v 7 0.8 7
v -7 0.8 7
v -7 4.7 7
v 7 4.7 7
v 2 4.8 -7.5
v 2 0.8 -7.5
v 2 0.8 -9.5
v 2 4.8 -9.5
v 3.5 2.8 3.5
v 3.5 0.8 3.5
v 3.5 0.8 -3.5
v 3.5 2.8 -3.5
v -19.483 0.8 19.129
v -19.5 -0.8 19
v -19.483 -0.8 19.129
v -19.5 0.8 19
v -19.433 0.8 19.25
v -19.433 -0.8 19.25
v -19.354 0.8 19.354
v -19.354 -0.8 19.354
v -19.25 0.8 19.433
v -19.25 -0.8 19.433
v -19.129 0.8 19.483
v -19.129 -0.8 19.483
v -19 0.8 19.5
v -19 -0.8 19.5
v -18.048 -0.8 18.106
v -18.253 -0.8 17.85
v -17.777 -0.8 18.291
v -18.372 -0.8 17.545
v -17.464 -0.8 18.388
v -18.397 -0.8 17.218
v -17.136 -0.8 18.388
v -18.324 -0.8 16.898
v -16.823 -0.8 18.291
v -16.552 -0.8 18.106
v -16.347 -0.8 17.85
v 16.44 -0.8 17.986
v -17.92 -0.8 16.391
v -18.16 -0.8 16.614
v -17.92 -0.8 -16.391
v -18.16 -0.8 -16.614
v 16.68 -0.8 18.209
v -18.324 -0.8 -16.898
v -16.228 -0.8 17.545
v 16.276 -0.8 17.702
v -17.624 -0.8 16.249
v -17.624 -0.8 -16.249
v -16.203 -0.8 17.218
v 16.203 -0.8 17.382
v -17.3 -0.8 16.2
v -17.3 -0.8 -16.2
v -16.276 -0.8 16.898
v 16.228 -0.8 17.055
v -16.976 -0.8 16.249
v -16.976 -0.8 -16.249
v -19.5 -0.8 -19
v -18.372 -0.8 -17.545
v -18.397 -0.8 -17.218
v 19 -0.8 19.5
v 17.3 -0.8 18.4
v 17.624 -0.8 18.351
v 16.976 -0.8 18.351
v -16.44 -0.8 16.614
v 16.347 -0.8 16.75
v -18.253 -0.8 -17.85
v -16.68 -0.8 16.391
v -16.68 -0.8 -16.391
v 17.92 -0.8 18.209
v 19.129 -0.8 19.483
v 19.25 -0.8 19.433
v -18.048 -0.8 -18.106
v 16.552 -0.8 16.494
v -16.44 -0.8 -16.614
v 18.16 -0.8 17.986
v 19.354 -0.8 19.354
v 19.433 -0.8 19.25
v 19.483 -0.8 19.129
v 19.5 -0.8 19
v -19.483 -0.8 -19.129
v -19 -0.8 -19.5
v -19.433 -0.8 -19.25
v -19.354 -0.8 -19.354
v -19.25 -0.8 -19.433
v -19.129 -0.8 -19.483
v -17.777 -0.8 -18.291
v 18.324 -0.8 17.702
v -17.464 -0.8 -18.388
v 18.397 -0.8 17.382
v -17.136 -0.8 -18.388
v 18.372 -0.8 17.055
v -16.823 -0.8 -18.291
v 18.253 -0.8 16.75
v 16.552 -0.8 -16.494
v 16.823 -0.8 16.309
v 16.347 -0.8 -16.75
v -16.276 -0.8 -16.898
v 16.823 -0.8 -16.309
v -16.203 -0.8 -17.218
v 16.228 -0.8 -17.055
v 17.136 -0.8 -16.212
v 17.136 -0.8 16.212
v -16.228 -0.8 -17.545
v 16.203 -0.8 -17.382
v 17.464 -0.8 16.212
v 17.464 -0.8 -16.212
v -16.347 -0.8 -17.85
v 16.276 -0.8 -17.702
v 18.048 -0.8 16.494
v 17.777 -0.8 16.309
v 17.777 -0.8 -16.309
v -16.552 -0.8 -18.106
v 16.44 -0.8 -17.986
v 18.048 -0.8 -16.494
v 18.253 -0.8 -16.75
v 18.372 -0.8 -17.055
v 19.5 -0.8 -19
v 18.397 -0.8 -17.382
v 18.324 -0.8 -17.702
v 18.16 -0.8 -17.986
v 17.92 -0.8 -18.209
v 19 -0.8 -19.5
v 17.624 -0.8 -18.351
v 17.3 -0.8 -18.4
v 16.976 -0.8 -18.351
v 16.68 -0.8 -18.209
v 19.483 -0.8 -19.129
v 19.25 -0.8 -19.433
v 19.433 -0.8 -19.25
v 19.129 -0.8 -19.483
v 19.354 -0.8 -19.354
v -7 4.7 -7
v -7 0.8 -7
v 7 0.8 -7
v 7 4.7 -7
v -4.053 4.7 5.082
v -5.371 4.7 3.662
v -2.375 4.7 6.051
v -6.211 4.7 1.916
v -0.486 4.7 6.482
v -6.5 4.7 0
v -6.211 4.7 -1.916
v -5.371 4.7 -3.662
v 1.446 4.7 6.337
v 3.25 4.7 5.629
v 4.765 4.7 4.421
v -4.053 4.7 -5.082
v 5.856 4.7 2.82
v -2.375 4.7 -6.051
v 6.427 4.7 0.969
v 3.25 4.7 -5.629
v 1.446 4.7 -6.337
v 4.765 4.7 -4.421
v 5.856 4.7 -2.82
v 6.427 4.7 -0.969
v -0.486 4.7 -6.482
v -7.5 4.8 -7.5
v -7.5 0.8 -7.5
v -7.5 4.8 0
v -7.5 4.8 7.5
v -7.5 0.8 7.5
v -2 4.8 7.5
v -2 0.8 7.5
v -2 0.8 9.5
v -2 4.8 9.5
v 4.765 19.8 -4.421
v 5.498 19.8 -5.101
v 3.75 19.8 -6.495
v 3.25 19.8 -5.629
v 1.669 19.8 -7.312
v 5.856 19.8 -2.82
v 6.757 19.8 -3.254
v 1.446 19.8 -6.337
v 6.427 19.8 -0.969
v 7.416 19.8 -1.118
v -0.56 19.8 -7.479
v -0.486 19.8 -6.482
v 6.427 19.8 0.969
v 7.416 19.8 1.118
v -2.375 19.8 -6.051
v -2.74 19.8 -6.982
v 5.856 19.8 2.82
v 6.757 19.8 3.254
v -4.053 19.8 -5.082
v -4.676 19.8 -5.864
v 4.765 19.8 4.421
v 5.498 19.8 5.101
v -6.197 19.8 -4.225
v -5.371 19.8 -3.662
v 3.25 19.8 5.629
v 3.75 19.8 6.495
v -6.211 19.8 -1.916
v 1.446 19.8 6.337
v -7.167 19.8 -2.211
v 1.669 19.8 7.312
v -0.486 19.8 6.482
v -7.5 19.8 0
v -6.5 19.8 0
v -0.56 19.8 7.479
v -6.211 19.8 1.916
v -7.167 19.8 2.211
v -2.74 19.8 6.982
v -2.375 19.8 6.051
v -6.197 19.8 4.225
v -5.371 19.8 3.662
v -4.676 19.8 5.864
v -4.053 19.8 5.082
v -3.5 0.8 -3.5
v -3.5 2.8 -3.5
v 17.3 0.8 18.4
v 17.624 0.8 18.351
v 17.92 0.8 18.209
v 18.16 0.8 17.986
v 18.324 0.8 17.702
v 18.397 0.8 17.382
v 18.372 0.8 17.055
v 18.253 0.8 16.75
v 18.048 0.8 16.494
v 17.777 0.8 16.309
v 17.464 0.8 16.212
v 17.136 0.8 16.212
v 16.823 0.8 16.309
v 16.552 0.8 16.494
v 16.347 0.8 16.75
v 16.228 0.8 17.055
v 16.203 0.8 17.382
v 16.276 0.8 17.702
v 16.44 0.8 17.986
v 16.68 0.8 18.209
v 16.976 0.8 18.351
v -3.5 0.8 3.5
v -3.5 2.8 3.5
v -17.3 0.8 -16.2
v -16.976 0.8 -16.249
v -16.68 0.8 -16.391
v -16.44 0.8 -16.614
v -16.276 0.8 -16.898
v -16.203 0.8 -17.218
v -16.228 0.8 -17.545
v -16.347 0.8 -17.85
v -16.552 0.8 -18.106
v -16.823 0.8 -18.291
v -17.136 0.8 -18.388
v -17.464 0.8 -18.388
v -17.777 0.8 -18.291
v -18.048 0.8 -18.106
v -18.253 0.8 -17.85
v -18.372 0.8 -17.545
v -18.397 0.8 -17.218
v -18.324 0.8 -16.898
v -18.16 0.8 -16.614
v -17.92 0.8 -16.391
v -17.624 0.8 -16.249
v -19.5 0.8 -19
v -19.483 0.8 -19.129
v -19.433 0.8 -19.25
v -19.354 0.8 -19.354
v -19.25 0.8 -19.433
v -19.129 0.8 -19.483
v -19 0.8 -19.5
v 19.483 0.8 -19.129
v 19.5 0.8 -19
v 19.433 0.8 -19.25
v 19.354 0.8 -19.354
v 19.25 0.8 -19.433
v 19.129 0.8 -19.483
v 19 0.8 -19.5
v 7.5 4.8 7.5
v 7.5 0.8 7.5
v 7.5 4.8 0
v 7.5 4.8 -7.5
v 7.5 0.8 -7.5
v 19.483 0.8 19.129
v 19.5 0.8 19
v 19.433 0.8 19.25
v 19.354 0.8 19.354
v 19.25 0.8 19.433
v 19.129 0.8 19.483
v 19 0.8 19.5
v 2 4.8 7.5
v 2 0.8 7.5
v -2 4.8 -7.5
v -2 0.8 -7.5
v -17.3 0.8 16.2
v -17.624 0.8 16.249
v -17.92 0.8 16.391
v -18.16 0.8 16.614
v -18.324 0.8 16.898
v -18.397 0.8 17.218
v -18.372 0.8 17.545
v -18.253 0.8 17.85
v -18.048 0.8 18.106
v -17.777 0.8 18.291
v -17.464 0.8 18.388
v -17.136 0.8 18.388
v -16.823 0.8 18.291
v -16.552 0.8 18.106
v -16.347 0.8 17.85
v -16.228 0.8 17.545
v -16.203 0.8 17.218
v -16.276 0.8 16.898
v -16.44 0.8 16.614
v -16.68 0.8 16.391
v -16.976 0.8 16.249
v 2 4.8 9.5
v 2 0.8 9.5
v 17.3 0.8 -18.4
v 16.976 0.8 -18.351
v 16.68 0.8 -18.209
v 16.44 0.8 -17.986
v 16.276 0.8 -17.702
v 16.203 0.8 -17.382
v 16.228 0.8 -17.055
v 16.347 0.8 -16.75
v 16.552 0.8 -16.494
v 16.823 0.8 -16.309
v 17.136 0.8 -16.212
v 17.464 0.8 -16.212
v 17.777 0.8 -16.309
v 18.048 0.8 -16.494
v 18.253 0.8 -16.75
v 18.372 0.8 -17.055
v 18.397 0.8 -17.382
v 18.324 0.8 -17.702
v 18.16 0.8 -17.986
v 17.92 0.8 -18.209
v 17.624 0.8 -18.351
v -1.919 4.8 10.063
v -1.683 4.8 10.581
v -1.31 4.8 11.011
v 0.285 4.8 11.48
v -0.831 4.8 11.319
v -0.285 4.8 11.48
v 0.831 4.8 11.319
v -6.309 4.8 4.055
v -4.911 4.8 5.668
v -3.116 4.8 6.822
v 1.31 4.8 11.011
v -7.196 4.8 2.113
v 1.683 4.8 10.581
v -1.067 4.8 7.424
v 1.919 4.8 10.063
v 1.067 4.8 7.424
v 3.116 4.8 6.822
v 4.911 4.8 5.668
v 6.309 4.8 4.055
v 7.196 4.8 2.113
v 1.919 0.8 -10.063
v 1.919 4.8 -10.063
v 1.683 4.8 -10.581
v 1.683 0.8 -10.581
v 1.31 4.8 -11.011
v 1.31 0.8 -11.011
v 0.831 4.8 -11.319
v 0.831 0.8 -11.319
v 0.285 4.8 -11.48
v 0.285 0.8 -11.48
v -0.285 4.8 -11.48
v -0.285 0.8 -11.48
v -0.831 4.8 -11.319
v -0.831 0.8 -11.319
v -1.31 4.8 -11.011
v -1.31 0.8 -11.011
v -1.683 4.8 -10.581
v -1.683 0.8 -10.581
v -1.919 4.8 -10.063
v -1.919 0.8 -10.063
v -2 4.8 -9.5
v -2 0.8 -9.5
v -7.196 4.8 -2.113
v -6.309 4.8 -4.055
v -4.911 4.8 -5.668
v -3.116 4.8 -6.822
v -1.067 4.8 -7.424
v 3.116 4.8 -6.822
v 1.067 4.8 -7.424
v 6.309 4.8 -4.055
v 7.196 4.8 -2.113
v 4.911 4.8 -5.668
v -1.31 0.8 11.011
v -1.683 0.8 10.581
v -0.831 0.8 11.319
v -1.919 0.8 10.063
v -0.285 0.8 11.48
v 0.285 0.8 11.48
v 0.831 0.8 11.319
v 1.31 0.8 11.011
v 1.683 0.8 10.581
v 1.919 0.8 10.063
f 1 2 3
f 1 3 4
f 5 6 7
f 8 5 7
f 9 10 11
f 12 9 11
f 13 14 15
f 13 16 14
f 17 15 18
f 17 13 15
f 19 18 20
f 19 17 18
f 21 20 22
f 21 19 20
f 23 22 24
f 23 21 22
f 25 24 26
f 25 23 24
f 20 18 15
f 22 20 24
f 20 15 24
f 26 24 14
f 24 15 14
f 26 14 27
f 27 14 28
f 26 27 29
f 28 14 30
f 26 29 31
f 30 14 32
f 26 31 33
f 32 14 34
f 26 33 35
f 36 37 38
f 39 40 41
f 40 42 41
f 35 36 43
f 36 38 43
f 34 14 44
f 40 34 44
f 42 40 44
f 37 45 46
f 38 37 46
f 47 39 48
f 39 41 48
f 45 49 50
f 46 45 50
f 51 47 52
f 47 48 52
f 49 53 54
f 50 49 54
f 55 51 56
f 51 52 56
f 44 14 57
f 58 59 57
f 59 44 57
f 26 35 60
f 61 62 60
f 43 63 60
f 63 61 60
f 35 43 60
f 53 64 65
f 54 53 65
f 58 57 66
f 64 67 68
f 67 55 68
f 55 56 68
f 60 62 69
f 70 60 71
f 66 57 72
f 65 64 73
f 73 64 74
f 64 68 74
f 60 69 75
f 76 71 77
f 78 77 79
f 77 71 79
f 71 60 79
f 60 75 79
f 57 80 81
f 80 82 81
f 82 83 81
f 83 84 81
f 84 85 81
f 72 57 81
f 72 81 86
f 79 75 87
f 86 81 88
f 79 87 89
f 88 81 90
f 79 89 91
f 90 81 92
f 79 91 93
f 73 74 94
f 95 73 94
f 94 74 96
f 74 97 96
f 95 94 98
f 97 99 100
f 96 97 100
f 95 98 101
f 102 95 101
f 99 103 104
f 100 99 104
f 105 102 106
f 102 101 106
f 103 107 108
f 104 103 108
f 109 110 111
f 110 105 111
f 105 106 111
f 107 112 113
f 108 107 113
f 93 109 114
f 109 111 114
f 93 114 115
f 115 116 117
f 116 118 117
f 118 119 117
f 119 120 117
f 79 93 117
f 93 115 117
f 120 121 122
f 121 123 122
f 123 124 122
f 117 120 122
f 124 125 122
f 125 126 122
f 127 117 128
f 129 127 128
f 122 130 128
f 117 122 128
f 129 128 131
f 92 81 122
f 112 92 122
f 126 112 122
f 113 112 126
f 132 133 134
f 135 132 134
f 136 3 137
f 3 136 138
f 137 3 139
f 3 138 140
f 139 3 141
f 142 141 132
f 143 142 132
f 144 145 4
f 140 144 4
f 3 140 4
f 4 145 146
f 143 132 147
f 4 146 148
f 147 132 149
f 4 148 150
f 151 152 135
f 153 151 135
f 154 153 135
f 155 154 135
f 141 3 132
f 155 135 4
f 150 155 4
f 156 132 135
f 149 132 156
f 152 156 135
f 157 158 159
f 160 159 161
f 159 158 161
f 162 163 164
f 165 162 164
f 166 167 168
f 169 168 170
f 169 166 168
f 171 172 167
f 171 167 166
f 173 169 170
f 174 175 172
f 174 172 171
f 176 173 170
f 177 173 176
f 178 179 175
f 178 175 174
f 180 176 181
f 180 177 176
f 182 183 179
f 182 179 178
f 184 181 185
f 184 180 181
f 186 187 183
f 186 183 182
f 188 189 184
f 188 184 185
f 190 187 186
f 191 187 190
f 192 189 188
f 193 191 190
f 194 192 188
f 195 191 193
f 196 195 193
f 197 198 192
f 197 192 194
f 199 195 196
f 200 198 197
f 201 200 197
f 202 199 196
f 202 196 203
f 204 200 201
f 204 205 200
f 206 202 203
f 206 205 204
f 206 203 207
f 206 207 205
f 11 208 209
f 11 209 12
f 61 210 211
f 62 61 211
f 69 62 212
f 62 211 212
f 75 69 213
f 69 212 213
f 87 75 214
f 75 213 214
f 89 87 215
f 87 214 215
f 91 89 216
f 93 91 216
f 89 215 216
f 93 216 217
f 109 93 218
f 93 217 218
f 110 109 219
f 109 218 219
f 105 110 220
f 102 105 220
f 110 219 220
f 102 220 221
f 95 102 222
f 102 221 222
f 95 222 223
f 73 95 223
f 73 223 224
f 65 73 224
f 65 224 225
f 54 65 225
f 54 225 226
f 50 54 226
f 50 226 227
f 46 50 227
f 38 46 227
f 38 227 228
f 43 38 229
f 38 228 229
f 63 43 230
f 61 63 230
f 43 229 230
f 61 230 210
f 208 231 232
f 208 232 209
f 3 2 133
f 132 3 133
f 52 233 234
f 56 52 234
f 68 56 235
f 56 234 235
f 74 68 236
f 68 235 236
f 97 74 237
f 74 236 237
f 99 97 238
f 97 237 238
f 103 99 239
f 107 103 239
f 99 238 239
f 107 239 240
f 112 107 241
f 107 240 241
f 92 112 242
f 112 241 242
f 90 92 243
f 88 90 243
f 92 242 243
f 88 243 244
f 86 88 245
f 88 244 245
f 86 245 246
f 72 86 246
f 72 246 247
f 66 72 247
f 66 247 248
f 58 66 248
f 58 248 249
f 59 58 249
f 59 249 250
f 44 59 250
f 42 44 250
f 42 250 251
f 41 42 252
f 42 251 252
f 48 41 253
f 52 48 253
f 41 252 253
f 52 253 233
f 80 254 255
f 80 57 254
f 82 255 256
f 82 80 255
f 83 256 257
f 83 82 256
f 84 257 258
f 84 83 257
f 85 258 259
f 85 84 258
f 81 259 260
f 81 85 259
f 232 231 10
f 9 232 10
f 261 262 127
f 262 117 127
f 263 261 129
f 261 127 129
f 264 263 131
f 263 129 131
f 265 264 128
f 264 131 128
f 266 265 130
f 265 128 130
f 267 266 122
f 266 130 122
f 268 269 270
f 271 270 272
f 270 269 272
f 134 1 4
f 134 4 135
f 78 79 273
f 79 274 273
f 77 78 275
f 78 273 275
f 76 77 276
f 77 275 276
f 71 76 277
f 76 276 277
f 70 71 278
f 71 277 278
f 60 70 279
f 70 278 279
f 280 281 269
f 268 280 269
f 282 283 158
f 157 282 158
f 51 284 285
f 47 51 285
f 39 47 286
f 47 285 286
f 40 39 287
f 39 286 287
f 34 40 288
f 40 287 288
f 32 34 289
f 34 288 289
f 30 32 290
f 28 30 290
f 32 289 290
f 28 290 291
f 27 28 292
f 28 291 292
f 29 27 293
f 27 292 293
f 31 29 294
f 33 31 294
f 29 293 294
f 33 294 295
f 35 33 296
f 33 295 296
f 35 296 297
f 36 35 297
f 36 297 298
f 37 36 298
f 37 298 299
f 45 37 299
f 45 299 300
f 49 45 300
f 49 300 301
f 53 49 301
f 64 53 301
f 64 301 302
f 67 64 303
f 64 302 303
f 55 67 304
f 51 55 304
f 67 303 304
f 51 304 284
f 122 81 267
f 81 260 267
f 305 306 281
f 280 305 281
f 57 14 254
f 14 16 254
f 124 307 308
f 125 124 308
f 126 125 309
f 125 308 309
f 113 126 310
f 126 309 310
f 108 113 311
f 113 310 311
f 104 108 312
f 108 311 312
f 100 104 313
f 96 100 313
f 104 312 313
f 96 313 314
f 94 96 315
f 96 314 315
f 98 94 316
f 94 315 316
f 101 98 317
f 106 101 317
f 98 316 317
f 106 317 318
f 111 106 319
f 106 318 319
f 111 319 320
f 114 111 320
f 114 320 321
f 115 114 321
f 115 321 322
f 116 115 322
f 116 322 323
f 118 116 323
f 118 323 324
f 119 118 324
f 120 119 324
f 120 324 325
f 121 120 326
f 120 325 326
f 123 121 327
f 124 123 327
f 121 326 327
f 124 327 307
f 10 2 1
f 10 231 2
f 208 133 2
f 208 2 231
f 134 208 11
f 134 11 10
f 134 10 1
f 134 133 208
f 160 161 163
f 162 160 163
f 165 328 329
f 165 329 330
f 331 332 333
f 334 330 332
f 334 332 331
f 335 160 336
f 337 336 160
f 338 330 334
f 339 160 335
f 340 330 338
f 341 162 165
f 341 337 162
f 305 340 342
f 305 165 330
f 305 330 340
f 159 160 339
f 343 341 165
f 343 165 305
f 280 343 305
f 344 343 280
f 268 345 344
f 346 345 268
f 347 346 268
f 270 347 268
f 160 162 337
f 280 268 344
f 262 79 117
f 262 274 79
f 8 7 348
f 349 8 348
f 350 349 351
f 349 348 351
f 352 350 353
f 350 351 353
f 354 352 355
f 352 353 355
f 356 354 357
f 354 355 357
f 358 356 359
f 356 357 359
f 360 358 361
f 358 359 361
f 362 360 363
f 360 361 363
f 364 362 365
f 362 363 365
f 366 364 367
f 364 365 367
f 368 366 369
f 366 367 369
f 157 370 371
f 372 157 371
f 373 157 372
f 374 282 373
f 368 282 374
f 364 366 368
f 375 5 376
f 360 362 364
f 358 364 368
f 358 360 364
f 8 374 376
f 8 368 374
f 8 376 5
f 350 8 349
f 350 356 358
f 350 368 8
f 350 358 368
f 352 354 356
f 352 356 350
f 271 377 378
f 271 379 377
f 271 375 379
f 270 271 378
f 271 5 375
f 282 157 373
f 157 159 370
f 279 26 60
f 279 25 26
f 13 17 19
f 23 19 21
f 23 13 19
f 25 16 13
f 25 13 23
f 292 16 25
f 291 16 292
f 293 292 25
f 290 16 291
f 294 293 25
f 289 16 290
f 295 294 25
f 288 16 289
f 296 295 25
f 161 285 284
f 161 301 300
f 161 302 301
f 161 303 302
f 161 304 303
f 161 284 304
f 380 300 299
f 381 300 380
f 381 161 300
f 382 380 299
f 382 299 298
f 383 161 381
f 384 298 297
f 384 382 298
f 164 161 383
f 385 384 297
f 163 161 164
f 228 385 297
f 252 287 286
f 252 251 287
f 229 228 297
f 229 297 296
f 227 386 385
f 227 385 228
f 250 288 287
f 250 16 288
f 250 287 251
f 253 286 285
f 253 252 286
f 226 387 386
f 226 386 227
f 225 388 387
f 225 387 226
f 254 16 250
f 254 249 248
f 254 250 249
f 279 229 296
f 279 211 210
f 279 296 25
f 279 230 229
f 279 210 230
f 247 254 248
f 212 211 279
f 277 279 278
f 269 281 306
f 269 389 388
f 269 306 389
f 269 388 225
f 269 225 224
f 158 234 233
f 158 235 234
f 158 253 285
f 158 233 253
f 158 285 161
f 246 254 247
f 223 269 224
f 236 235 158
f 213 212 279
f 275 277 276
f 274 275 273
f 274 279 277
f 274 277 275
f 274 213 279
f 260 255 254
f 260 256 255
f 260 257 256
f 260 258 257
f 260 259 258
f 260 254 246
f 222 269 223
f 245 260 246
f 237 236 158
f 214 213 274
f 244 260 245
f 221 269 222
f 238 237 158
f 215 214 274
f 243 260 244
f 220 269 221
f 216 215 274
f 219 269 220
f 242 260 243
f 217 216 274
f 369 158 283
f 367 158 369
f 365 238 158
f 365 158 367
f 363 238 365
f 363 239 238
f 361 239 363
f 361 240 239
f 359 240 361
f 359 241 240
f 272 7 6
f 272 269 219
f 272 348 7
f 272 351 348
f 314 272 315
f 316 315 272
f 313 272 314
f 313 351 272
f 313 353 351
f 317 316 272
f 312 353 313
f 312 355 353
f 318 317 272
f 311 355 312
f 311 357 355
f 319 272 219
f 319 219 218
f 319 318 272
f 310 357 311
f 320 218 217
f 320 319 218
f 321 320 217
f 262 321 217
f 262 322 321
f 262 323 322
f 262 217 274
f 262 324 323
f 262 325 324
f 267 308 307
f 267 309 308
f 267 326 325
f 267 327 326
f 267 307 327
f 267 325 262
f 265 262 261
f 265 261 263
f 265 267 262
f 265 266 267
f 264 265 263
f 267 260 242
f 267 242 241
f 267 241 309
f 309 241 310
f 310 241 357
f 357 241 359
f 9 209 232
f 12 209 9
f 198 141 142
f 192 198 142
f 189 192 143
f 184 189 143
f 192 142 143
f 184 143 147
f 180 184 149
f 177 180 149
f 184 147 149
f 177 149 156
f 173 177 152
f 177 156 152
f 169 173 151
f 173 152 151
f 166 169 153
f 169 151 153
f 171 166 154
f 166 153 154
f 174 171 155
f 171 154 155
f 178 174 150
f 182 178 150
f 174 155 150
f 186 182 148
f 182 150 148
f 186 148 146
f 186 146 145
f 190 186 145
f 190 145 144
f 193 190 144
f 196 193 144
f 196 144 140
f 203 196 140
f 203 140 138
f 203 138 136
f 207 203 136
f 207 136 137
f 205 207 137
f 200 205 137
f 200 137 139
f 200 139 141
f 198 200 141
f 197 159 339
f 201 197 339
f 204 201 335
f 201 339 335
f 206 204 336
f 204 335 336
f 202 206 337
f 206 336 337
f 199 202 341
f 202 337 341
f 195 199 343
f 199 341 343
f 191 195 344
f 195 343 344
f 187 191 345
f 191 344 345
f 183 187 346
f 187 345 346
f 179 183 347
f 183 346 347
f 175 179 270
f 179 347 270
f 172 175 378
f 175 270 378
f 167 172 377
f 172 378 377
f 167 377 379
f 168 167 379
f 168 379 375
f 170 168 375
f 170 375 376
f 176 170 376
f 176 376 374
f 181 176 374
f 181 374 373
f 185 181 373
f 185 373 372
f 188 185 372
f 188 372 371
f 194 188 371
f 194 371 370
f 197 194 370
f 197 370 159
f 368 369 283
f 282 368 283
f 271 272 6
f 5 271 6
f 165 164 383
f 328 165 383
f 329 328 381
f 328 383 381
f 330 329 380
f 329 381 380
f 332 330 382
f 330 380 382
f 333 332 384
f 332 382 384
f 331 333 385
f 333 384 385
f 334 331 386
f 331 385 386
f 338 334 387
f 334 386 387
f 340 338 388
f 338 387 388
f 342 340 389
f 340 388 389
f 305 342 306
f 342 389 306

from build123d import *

# Parameters (mm, degrees)
SKETCH1_W                 = 39
SKETCH1_H                 = 39
BOSS_EXTRUDE1_DEPTH       = 0.8
FILLET1_R                 = 0.5
SKETCH2_R                 = 1.1
CUT_EXTRUDE1_DEPTH        = 1.6
SKETCH3_W                 = 7
SKETCH3_H                 = 7
BOSS_EXTRUDE2_DEPTH       = 2
SKETCH4_W                 = 14
SKETCH4_H                 = 14
BOSS_EXTRUDE3_DEPTH       = 4
SKETCH5_W                 = 15
SKETCH5_H                 = 15
BOSS_EXTRUDE4_DEPTH       = 0.1
SKETCH6_R                 = 7.5
BOSS_EXTRUDE5_DEPTH       = 15
M12_CLEARANCE_HOLE1_D     = 13
M12_CLEARANCE_HOLE1_DEPTH = 15.1


with BuildPart() as part:
    # Sketch1 → Boss-Extrude1 (new, symmetric)
    with BuildSketch(Plane(origin=(0, 0, 0), x_dir=(1, 0, 0), z_dir=(0, 1, 0))):
        Rectangle(SKETCH1_W, SKETCH1_H)
    extrude(amount=BOSS_EXTRUDE1_DEPTH, both=True)

    # Fillet1
    fillet1_edges = [part.edges().sort_by_distance(p)[0] for p in [
        (19.5, 0, 19.5),
        (-19.5, 0, 19.5),
        (-19.5, 0, -19.5),
        (19.5, 0, -19.5),
    ]]
    fillet(fillet1_edges, radius=FILLET1_R)

    # Sketch2 → Cut-Extrude1 (cut)
    with BuildSketch(Plane(origin=(0, 0.8, 0), x_dir=(1, 0, 0), z_dir=(0, 1, 0))):
        with Locations(Location((-17.3, 17.3, 0), (0, 0, 270))):
            Circle(SKETCH2_R)
        with Locations(Location((-17.3, -17.3, 0), (0, 0, 90))):
            Circle(SKETCH2_R)
        with Locations(Location((17.3, -17.3, 0), (0, 0, 270))):
            Circle(SKETCH2_R)
        with Locations(Location((17.3, 17.3, 0), (0, 0, 90))):
            Circle(SKETCH2_R)
    extrude(amount=-CUT_EXTRUDE1_DEPTH, mode=Mode.SUBTRACT)

    # Sketch3 → Boss-Extrude2 (add)
    with BuildSketch(Plane(origin=(0, 0.8, 0), x_dir=(1, 0, 0), z_dir=(0, 1, 0))):
        Rectangle(SKETCH3_W, SKETCH3_H)
    extrude(amount=BOSS_EXTRUDE2_DEPTH)

    # Sketch4 → Boss-Extrude3 (add)
    with BuildSketch(Plane(origin=(0, 0.8, 0), x_dir=(1, 0, 0), z_dir=(0, 1, 0))):
        with BuildLine():
            Line((-2, 9.5), (-2, 7.5))
            Line((-2, 7.5), (-7.5, 7.5))
            Line((-7.5, 7.5), (-7.5, -7.5))
            Line((-7.5, -7.5), (-2, -7.5))
            Line((-2, -7.5), (-2, -9.5))
            ThreePointArc((-2, -9.5), (0, -11.5), (2, -9.5))
            Line((2, -9.5), (2, -7.5))
            Line((2, -7.5), (7.5, -7.5))
            Line((7.5, -7.5), (7.5, 7.5))
            Line((7.5, 7.5), (2, 7.5))
            Line((2, 7.5), (2, 9.5))
            ThreePointArc((2, 9.5), (0, 11.5), (-2, 9.5))
        make_face()
        Rectangle(SKETCH4_W, SKETCH4_H, mode=Mode.SUBTRACT)
    extrude(amount=BOSS_EXTRUDE3_DEPTH)

    # Sketch5 → Boss-Extrude4 (add)
    with BuildSketch(Plane(origin=(0, 4.8, 0), x_dir=(1, 0, 0), z_dir=(0, 1, 0))):
        Rectangle(SKETCH5_W, SKETCH5_H)
    extrude(amount=-BOSS_EXTRUDE4_DEPTH)

    # Sketch6 → Boss-Extrude5 (add)
    with BuildSketch(Plane(origin=(0, 4.8, 0), x_dir=(1, 0, 0), z_dir=(0, 1, 0))):
        with Locations(Location((0, 0, 0), (0, 0, 180))):
            Circle(SKETCH6_R)
    extrude(amount=BOSS_EXTRUDE5_DEPTH)

    # M12 Clearance Hole1
    with Locations(Plane(origin=(0, 19.8, 0), x_dir=(1, 0, 0), z_dir=(0, 1, 0))):
        with Locations((0, 0)):
            Hole(M12_CLEARANCE_HOLE1_D / 2, depth=M12_CLEARANCE_HOLE1_DEPTH)


solid = part.part
